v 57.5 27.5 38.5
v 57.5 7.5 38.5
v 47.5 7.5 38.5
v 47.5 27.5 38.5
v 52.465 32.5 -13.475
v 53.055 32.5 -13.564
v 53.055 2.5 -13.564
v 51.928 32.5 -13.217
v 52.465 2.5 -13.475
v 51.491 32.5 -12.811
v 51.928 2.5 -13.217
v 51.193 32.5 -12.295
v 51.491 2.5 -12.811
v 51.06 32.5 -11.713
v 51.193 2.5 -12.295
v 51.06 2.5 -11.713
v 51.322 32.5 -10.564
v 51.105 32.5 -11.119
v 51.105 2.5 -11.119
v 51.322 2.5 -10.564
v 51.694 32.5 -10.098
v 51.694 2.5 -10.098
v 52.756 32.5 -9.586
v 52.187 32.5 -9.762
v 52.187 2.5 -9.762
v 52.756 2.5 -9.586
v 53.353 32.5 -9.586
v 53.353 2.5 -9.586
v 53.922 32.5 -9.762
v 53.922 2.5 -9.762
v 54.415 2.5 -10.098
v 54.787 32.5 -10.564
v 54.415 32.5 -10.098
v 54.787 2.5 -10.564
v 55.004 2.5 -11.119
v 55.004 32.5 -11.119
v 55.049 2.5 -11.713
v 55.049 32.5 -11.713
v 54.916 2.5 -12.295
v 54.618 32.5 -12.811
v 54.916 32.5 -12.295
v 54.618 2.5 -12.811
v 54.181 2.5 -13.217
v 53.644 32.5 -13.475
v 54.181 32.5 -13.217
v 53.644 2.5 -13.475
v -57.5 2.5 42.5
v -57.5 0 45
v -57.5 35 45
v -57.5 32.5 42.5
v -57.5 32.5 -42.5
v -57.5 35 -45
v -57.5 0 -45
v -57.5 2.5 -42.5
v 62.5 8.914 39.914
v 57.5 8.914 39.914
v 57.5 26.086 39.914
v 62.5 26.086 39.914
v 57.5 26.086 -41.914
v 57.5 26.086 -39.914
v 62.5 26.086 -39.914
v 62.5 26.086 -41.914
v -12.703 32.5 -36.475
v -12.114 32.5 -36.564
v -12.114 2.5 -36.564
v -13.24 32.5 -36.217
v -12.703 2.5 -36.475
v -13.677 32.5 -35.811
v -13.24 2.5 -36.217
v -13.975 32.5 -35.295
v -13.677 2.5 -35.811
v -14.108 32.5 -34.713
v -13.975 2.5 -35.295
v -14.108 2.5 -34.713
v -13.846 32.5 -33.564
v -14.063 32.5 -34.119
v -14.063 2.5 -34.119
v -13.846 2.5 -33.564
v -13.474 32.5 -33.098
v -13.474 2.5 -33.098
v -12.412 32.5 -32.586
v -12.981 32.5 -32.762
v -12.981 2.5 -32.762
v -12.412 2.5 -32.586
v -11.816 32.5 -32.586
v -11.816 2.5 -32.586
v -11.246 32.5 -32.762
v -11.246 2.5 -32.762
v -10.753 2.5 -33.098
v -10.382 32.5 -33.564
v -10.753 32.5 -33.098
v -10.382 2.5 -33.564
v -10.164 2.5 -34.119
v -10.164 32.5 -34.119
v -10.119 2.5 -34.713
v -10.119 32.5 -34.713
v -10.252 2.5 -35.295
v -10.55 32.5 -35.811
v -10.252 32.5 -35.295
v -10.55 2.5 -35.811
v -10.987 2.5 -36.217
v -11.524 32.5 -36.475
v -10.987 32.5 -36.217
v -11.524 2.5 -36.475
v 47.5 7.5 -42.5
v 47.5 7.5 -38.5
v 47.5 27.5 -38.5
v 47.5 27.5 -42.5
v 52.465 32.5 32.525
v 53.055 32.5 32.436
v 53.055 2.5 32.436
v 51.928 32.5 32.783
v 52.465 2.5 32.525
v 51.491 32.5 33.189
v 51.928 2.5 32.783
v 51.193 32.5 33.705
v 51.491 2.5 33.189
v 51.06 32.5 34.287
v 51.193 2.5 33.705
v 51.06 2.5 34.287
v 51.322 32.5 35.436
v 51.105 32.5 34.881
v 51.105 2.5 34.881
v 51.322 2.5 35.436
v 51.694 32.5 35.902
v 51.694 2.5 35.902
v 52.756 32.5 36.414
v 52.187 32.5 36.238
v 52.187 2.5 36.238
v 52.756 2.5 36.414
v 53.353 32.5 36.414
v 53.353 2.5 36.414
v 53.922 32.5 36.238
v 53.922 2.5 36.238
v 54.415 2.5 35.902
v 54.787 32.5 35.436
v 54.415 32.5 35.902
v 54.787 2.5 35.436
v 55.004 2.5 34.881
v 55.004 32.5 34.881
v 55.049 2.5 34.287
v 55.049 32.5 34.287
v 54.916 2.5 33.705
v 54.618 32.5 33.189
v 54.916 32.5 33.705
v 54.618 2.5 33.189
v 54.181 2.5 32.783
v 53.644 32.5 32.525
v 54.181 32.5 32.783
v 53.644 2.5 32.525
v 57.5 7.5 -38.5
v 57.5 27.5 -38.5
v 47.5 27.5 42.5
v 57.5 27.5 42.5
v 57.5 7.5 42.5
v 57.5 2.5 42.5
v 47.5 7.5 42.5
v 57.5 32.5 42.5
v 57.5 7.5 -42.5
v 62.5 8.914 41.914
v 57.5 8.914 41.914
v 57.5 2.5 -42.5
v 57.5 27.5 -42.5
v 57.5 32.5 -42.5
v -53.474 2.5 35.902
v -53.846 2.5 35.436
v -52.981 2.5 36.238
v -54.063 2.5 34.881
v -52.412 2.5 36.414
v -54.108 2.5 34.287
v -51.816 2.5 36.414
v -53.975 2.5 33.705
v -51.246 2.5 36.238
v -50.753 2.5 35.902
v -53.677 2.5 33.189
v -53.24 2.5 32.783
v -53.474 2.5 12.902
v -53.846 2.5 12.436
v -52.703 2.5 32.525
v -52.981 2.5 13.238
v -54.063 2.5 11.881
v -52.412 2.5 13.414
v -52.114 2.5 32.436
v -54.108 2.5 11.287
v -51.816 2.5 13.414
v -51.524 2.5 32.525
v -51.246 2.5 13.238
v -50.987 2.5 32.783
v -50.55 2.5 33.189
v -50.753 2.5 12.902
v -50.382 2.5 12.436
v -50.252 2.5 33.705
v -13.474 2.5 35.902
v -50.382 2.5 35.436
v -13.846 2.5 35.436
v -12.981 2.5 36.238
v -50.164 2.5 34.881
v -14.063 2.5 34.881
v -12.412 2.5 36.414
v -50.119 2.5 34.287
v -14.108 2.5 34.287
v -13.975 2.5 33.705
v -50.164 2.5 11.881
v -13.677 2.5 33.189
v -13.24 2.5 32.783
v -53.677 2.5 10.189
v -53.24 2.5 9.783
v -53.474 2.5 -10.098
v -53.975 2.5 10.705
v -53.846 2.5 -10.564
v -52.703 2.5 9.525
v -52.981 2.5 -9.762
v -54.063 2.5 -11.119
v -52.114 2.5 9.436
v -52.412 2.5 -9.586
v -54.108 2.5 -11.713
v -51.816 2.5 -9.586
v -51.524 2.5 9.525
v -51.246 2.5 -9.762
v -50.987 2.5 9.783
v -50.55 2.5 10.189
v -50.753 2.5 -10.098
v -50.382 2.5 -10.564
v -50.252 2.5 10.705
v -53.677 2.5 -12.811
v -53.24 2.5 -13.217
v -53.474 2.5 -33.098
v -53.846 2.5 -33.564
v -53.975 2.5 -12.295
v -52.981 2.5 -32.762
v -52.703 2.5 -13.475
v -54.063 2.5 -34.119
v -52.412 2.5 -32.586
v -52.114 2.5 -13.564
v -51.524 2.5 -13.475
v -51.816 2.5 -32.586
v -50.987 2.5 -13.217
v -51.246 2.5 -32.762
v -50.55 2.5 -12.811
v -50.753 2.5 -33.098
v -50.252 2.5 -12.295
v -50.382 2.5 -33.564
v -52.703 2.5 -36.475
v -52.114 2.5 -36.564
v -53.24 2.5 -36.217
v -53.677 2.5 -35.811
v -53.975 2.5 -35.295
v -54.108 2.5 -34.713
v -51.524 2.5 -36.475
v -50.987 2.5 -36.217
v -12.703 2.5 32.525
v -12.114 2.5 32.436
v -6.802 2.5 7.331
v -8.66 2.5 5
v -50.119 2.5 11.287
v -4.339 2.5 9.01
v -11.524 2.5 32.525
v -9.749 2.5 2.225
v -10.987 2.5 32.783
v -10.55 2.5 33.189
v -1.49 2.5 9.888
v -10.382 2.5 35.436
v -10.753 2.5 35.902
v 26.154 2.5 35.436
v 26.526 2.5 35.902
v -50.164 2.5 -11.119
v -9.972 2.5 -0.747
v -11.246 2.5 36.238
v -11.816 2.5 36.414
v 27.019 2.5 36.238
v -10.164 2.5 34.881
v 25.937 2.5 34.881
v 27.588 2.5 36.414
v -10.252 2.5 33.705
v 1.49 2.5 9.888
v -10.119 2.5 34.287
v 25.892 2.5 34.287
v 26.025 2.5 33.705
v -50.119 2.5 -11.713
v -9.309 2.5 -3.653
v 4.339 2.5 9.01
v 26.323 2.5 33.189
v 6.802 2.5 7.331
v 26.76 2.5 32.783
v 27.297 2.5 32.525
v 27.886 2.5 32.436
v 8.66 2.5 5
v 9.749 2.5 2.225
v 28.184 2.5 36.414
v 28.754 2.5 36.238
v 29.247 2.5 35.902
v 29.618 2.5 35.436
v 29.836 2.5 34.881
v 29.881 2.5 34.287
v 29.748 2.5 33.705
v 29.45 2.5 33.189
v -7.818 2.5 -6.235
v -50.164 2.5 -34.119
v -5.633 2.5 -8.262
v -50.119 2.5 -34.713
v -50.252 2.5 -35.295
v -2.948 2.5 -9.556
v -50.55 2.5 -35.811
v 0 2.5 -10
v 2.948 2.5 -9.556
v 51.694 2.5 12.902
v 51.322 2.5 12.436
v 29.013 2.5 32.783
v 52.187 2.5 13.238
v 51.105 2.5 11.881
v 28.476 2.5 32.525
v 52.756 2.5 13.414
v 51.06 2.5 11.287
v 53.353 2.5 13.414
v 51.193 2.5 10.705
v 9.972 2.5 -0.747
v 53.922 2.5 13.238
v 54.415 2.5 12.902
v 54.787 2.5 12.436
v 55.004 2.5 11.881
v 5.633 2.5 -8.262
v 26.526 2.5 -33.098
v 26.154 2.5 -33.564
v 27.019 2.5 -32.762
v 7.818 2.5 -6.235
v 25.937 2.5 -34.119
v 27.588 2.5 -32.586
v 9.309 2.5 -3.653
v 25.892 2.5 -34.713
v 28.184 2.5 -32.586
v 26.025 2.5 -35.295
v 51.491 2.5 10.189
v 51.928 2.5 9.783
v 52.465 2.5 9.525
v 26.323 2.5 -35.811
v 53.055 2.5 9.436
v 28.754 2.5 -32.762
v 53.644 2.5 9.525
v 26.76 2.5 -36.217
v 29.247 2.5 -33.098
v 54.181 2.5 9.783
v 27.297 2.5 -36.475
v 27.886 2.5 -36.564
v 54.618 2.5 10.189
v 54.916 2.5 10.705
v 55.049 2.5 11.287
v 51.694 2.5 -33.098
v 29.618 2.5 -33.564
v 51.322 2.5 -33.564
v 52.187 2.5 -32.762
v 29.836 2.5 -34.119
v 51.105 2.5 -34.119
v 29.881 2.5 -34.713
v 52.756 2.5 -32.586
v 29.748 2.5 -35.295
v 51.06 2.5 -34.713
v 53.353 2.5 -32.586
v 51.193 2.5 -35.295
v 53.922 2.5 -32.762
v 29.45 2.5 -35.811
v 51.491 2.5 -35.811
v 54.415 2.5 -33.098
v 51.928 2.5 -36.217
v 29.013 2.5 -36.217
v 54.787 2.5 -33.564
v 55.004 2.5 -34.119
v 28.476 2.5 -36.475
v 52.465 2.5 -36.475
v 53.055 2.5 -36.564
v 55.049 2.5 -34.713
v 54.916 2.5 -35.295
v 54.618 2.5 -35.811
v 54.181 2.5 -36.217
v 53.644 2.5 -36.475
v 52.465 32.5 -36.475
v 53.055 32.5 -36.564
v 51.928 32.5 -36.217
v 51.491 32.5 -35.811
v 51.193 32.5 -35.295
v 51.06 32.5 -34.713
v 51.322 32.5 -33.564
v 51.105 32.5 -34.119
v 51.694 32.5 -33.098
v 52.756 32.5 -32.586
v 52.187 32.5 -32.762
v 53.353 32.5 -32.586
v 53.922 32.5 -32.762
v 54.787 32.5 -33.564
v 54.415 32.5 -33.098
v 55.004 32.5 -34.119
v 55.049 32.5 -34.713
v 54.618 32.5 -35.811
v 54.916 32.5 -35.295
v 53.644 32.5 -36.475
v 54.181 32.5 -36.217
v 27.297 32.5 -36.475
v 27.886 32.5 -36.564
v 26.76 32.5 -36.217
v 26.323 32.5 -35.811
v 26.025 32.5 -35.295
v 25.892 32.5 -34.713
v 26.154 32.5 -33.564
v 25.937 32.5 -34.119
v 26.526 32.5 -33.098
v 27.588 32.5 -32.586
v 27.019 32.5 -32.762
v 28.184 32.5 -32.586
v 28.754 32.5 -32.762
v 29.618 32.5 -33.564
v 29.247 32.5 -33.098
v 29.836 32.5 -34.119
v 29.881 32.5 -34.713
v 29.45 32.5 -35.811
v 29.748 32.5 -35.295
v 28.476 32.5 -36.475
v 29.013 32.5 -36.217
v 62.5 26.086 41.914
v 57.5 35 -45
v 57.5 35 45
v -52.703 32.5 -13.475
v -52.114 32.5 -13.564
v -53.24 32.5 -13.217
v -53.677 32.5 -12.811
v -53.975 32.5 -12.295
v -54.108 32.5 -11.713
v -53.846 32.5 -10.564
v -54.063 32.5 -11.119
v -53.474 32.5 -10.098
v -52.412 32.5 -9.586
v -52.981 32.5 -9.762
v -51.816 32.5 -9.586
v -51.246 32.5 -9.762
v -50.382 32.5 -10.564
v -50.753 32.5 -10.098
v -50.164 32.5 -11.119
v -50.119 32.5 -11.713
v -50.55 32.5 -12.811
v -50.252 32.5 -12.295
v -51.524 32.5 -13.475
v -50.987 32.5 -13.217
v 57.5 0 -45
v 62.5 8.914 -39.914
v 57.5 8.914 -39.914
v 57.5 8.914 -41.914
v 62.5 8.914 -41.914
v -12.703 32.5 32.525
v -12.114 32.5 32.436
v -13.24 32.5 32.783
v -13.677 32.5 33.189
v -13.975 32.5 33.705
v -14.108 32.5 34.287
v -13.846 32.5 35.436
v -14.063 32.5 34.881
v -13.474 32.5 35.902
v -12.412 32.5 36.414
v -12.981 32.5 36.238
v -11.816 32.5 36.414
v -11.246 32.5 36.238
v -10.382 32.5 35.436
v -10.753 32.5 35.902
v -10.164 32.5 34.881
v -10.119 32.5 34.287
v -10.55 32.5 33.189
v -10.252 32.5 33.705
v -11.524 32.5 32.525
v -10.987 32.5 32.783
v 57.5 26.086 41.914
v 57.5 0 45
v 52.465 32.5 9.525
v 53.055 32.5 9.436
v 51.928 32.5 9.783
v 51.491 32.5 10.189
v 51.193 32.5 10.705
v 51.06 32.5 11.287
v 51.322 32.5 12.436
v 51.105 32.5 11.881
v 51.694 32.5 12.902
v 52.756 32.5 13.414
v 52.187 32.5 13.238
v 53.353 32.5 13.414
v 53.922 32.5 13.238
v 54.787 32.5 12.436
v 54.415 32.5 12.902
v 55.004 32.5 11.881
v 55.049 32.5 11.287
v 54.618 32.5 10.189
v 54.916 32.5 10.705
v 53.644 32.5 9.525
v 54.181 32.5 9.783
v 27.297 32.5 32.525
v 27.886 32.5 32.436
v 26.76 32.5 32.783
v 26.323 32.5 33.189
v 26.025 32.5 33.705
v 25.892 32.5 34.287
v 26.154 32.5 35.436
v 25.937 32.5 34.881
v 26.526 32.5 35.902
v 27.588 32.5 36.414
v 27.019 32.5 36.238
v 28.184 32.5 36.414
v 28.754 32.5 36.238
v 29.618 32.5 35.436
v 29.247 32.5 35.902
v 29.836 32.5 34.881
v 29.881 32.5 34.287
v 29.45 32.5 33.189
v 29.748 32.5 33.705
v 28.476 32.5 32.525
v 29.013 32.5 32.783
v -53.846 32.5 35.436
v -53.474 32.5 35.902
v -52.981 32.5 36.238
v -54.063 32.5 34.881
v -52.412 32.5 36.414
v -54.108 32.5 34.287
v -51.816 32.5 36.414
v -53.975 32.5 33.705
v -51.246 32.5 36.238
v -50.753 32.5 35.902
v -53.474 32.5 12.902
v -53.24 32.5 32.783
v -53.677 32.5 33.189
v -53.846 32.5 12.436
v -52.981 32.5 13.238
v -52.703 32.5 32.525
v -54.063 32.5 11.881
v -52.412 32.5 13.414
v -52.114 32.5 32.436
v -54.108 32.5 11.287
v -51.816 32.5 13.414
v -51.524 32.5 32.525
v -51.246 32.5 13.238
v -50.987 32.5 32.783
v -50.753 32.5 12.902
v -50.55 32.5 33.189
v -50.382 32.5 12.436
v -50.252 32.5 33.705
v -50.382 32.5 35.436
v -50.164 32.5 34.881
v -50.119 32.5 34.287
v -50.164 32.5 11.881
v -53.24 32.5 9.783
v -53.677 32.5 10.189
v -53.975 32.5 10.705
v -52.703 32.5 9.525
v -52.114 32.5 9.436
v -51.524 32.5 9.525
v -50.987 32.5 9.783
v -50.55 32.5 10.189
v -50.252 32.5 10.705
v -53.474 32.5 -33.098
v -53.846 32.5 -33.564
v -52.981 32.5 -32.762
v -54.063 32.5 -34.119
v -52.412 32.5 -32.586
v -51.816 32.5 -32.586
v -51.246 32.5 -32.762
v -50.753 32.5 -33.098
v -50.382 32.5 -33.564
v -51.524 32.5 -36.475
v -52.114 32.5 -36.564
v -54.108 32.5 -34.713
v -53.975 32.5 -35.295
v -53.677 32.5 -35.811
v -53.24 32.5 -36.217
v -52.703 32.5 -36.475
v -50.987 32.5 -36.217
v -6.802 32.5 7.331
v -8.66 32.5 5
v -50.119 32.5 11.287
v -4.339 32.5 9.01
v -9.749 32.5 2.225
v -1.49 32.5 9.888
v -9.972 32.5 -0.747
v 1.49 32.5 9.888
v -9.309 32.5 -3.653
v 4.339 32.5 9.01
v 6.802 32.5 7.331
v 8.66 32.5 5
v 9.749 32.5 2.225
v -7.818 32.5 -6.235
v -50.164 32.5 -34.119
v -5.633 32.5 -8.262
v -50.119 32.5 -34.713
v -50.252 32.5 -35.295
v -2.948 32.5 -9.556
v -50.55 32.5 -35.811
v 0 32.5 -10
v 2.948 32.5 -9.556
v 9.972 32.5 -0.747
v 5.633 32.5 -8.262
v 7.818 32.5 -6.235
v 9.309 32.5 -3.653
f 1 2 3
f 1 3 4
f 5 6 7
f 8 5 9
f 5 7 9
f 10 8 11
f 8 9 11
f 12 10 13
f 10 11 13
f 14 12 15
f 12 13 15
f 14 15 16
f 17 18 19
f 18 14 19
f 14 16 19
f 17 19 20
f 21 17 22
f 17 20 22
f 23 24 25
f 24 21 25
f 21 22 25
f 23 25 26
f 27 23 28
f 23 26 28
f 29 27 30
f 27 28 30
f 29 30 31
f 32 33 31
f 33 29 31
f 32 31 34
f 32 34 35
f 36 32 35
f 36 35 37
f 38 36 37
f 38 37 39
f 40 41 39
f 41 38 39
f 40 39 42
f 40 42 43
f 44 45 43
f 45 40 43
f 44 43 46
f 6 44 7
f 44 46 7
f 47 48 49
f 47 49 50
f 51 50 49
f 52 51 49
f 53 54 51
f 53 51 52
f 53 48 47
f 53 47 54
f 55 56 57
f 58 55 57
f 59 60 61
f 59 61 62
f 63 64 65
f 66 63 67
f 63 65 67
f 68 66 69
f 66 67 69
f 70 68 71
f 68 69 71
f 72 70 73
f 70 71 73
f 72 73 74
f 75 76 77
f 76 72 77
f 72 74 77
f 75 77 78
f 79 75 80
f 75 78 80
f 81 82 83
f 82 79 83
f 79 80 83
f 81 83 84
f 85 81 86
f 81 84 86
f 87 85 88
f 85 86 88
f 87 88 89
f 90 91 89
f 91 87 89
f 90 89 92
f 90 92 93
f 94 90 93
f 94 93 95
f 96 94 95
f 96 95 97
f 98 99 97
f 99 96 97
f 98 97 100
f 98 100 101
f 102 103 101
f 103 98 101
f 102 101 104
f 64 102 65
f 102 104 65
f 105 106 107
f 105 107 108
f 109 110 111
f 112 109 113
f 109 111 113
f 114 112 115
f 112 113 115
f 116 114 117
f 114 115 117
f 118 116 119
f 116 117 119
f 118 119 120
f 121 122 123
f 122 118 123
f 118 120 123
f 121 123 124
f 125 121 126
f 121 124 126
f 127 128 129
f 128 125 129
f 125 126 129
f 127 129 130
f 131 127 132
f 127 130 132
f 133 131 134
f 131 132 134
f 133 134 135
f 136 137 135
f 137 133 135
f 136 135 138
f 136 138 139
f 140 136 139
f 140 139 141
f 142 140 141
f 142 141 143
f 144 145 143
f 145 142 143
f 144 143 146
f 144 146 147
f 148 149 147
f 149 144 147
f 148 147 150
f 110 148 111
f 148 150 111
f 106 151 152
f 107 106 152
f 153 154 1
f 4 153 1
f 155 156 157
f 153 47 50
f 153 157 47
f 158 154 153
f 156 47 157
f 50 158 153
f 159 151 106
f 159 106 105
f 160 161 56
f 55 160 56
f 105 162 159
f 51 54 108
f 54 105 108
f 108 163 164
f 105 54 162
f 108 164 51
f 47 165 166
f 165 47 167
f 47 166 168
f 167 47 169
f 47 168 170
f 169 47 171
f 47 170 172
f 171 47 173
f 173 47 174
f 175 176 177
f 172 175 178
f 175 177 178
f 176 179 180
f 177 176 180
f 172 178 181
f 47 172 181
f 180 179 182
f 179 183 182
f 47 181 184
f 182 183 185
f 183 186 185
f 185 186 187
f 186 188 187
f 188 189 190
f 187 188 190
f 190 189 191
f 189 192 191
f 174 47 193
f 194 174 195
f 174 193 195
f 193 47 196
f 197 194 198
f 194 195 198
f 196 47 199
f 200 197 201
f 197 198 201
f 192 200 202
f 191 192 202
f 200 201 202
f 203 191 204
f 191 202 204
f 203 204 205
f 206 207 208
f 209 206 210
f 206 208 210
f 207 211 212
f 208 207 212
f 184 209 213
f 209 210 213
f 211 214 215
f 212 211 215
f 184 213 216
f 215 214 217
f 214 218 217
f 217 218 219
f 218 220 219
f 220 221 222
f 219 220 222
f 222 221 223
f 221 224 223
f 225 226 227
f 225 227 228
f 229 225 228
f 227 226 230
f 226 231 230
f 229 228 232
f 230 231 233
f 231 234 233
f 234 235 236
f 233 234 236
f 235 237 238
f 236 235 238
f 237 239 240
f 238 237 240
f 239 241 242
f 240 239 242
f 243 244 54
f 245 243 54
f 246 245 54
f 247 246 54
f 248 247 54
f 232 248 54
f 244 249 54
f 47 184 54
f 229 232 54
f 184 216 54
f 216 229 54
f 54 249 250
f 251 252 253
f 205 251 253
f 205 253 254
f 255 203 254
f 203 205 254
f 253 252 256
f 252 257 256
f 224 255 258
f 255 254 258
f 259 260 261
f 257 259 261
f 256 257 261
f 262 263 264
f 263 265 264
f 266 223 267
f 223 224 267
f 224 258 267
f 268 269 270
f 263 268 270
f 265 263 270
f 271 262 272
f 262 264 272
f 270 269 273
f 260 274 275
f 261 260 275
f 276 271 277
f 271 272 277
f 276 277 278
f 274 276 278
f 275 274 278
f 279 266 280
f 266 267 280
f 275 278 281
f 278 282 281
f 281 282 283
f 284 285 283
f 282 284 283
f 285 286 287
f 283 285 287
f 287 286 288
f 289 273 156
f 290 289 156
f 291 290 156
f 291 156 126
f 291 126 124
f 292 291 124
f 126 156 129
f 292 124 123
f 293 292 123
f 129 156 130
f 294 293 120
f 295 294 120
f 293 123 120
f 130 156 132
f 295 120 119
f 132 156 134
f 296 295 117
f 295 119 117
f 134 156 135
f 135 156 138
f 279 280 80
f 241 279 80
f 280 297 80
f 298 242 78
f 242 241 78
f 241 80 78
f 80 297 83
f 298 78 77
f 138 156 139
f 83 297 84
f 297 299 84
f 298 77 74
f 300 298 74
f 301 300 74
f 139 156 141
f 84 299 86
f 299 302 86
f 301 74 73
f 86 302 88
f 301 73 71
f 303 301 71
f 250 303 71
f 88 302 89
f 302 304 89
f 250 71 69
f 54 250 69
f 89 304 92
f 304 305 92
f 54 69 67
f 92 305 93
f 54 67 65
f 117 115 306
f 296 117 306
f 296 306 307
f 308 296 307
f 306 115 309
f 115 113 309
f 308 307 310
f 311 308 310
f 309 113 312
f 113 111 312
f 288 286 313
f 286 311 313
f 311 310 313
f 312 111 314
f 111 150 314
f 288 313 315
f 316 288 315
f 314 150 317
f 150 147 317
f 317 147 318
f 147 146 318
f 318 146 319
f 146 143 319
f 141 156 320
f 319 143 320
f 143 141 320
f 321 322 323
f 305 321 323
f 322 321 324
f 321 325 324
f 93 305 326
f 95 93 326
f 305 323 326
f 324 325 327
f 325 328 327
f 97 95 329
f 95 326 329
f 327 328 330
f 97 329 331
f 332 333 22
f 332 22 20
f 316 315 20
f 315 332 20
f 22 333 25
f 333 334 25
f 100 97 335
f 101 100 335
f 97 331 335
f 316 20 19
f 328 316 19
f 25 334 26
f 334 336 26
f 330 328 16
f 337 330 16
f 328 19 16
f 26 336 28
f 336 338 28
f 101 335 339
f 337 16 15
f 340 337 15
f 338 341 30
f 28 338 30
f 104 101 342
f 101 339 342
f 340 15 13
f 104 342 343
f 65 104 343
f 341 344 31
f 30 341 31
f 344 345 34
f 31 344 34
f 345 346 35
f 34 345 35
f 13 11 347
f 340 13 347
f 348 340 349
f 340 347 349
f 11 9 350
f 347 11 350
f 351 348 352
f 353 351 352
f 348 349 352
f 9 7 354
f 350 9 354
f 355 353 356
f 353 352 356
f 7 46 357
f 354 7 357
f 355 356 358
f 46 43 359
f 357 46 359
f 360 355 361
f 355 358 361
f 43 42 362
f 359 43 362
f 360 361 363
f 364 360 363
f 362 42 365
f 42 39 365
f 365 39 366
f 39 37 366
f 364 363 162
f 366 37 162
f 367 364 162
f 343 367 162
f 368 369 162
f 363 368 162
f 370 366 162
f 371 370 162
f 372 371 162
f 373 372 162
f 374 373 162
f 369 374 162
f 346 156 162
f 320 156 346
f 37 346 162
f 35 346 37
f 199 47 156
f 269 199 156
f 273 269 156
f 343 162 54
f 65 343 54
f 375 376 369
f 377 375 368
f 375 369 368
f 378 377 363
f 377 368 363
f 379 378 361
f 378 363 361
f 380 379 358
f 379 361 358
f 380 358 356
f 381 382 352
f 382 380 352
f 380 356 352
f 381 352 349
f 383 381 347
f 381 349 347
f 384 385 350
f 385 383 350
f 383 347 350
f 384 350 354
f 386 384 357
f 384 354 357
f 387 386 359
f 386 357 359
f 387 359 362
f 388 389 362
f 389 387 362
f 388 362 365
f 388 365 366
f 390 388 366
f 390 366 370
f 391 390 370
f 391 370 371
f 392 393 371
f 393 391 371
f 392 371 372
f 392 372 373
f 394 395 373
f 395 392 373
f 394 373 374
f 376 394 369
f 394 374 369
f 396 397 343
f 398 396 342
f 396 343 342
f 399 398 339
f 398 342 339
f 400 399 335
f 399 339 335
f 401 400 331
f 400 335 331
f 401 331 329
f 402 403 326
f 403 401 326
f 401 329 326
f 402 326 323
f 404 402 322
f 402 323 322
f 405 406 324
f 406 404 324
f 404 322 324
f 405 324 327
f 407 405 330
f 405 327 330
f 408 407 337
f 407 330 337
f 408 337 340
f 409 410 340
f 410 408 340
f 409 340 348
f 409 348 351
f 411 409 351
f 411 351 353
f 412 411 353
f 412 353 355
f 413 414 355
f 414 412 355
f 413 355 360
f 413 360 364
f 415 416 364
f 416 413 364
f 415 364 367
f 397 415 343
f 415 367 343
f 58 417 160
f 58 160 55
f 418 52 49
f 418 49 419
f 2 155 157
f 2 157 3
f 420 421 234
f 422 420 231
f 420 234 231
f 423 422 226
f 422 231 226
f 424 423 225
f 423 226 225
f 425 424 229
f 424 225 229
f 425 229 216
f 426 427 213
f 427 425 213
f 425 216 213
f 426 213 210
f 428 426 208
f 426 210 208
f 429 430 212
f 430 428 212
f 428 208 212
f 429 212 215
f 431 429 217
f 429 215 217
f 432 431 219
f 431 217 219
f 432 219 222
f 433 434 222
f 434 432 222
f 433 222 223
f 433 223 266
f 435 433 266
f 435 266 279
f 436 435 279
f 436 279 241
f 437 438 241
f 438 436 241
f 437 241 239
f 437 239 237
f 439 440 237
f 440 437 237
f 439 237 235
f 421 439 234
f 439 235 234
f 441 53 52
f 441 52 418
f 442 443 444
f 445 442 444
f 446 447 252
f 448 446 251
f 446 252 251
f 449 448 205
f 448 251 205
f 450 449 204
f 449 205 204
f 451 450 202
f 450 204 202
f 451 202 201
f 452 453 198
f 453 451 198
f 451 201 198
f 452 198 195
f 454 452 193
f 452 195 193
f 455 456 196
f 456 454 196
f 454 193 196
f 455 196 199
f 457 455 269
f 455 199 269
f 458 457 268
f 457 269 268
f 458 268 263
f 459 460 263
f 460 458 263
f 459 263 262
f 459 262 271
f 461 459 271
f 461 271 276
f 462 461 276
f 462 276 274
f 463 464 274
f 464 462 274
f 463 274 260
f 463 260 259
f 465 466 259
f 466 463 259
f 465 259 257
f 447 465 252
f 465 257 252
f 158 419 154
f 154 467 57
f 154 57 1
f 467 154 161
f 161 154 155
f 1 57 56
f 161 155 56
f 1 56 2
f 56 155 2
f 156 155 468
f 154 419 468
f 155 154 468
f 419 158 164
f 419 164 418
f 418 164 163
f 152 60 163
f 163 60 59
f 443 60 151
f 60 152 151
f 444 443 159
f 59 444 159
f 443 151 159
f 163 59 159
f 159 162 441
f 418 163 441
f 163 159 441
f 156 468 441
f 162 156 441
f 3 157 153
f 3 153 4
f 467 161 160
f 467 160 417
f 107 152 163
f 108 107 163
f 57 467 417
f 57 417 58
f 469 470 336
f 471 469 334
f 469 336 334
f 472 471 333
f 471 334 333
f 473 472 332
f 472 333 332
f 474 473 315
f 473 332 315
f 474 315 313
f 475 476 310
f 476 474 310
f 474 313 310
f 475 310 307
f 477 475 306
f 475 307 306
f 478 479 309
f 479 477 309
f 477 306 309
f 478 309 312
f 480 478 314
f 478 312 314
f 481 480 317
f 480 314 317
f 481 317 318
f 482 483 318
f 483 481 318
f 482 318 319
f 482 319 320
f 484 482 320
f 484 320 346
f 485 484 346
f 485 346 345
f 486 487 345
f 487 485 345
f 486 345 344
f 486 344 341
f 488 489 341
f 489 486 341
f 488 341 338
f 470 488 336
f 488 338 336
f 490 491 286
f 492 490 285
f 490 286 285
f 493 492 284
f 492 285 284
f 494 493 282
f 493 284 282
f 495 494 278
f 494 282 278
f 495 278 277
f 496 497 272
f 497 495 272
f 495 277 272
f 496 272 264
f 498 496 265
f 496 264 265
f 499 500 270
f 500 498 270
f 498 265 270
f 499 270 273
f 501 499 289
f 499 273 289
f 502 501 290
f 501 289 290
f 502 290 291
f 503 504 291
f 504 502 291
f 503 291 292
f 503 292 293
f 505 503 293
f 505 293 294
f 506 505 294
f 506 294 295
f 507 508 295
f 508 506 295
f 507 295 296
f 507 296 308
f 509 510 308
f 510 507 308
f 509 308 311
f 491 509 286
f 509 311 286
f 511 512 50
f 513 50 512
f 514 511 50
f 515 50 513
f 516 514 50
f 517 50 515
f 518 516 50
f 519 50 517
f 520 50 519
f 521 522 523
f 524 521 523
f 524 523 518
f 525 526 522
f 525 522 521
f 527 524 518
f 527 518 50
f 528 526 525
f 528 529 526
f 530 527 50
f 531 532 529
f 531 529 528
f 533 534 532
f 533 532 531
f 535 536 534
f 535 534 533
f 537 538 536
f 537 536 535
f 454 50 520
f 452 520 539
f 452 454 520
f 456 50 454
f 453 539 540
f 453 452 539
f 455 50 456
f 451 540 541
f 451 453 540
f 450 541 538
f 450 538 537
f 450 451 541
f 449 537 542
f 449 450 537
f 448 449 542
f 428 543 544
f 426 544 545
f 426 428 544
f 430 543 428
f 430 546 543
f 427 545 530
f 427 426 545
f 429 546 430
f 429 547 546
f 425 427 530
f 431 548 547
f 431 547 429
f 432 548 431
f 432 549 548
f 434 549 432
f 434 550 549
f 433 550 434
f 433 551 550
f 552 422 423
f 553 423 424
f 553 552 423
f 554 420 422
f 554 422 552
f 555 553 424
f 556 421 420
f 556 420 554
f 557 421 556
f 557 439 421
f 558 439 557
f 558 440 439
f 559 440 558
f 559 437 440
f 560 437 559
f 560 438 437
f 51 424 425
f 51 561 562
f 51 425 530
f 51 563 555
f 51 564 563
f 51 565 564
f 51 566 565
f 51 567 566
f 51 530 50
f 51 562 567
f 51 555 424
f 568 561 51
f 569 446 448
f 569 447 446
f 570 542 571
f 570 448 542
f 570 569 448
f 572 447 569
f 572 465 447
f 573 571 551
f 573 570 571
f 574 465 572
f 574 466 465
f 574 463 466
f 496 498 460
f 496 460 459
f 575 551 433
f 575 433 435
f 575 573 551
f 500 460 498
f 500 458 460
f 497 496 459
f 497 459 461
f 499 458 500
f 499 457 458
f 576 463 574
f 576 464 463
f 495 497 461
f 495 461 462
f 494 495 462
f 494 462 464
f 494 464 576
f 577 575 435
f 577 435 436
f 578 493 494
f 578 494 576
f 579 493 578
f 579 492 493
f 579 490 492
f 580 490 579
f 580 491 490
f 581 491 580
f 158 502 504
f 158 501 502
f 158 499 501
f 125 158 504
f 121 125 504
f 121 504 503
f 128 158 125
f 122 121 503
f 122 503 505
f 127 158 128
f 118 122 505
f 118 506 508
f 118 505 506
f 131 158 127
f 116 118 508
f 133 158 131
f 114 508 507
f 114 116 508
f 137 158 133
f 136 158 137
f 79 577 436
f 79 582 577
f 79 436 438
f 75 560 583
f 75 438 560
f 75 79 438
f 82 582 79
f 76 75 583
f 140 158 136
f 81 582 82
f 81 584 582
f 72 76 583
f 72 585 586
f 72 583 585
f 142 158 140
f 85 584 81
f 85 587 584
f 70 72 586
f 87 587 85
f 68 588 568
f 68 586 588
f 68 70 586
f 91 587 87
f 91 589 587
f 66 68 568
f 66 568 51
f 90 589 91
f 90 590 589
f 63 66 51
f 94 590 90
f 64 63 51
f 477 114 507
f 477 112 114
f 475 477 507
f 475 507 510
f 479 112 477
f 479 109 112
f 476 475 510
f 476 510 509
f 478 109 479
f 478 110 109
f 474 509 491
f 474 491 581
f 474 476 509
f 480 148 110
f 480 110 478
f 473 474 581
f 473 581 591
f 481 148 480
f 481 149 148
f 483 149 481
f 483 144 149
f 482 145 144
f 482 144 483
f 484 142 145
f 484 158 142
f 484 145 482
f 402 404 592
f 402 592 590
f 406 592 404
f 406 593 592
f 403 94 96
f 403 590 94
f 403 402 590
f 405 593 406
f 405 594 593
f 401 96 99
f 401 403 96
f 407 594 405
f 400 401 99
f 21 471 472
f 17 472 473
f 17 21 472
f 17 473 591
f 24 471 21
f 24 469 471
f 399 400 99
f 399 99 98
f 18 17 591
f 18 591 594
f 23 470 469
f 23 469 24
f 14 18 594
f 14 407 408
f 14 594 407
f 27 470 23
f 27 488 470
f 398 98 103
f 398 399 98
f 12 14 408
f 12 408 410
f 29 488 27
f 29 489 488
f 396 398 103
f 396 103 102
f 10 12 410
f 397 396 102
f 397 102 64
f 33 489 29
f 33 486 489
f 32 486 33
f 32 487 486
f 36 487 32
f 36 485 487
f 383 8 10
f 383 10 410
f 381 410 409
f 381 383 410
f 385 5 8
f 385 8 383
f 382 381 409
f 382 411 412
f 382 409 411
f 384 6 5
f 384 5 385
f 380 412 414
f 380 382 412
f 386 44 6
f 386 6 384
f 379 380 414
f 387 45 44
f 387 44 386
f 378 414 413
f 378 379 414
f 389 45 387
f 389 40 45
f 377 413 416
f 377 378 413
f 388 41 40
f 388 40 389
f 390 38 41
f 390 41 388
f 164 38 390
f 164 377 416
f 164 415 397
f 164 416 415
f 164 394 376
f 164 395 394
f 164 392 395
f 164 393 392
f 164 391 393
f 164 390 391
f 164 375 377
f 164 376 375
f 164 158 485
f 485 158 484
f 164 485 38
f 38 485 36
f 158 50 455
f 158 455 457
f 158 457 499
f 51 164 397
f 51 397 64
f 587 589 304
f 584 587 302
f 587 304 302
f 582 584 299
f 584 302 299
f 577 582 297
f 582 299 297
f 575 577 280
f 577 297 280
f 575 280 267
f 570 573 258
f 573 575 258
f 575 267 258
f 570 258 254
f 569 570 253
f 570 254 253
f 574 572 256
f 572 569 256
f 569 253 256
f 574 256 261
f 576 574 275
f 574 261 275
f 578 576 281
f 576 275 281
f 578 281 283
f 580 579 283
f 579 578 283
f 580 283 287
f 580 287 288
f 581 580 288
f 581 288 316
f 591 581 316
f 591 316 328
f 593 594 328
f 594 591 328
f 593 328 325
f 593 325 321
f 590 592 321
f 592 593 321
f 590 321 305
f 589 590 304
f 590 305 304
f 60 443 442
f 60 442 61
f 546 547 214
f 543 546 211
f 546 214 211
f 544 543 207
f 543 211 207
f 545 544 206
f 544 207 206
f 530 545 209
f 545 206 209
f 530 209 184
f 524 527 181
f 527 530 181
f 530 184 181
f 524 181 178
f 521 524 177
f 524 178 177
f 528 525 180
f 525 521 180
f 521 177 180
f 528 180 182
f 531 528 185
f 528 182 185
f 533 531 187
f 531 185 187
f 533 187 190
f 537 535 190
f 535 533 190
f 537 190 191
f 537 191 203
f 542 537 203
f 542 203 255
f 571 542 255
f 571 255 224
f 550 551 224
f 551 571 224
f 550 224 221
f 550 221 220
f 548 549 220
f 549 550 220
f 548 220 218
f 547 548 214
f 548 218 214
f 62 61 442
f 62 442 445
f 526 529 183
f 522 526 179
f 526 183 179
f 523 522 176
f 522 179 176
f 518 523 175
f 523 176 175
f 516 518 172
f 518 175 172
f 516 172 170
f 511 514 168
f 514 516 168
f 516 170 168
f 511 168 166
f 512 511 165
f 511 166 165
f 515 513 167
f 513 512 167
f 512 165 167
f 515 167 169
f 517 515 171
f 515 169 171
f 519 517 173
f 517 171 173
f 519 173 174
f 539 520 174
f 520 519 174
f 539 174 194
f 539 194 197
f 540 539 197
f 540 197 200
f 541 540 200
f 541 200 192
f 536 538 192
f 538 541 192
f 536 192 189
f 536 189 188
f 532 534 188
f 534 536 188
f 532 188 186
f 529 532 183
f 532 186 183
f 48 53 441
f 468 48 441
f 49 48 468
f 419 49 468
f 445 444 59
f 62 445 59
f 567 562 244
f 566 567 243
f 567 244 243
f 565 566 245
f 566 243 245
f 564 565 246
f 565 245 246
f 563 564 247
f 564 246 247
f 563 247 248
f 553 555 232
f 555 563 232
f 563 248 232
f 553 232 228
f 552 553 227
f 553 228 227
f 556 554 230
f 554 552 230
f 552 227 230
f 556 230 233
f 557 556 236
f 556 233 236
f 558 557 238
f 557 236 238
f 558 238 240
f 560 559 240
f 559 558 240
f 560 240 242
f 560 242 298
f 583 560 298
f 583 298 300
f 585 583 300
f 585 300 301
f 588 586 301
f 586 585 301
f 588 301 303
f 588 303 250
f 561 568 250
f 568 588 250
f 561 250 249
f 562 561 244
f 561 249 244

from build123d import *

# Parameters (mm, degrees)
SKETCH_1_W          = 115
SKETCH_1_H          = 90
EXTRUDE_1_DEPTH     = 35
SKETCH_2_W          = 85
SKETCH_2_H          = 30
CUT_EXTRUDE_1_DEPTH = 129.35497653
SKETCH_3_W          = 4
SKETCH_3_H          = 20
EXTRUDE_2_DEPTH     = 10
SKETCH_4_W          = 2
SKETCH_4_H          = 17.171572876
EXTRUDE_3_DEPTH     = 5
SKETCH_5_R          = 2
SKETCH_5_R_2        = 10
EXTRUDE_4_DEPTH     = 32


with BuildPart() as part:
    # Эскиз1 → Бобышка-Вытянуть1 (new body)
    with BuildSketch(Plane(origin=(0, 0, 0), x_dir=(1, 0, 0), z_dir=(0, 1, 0))):
        Rectangle(SKETCH_1_W, SKETCH_1_H)
    extrude(amount=EXTRUDE_1_DEPTH)

    # Эскиз2 → Вырез-Вытянуть1 (cut, through all)
    with BuildSketch(Plane(origin=(57.5, 0, 0), x_dir=(0, 0, -1), z_dir=(1, 0, 0))):
        with Locations((0, 17.5)):
            Rectangle(SKETCH_2_W, SKETCH_2_H)
    extrude(amount=-CUT_EXTRUDE_1_DEPTH, mode=Mode.SUBTRACT)

    # Эскиз3 → Бобышка-Вытянуть2 (add)
    with BuildSketch(Plane(origin=(57.5, 0, 0), x_dir=(0, 0, -1), z_dir=(1, 0, 0))):
        with Locations((40.5, 17.5)):
            Rectangle(SKETCH_3_W, SKETCH_3_H)
        with Locations((-40.5, 17.5)):
            Rectangle(SKETCH_3_W, SKETCH_3_H)
    extrude(amount=-EXTRUDE_2_DEPTH)

    # Эскиз4 → Бобышка-Вытянуть3 (add)
    with BuildSketch(Plane(origin=(57.5, 0, 0), x_dir=(0, 0, -1), z_dir=(1, 0, 0))):
        with Locations((40.914213562, 17.5)):
            Rectangle(SKETCH_4_W, SKETCH_4_H)
        with Locations((-40.914213562, 17.5)):
            Rectangle(SKETCH_4_W, SKETCH_4_H)
    extrude(amount=EXTRUDE_3_DEPTH)

    # Эскиз5 → Бобышка-Вытянуть4 (add)
    with BuildSketch(Plane(origin=(0, 2.5, 0), x_dir=(1, 0, 0), z_dir=(0, 1, 0))):
        with Locations(Location((-52.113626613, 34.564029455, 0), (0, 0, 90))):
            Circle(SKETCH_5_R)
        with Locations(Location((-52.113626613, 11.564029455, 0), (0, 0, 90))):
            Circle(SKETCH_5_R)
        with Locations(Location((-52.113626613, -11.435970545, 0), (0, 0, 90))):
            Circle(SKETCH_5_R)
        with Locations(Location((-52.113626613, -34.435970545, 0), (0, 0, 90))):
            Circle(SKETCH_5_R)
        with Locations(Location((53.054505716, 34.564029455, 0), (0, 0, 90))):
            Circle(SKETCH_5_R)
        with Locations(Location((53.054505716, 11.564029455, 0), (0, 0, 90))):
            Circle(SKETCH_5_R)
        with Locations(Location((53.054505716, -11.435970545, 0), (0, 0, 90))):
            Circle(SKETCH_5_R)
        with Locations(Location((53.054505716, -34.435970545, 0), (0, 0, 90))):
            Circle(SKETCH_5_R)
        with Locations(Location((-12.113626613, 34.564029455, 0), (0, 0, 90))):
            Circle(SKETCH_5_R)
        with Locations(Location((27.886373387, 34.564029455, 0), (0, 0, 90))):
            Circle(SKETCH_5_R)
        with Locations(Location((-12.113626613, -34.435970545, 0), (0, 0, 90))):
            Circle(SKETCH_5_R)
        with Locations(Location((27.886373387, -34.435970545, 0), (0, 0, 90))):
            Circle(SKETCH_5_R)
        with Locations(Location((0, 0, 0), (0, 0, 90))):
            Circle(SKETCH_5_R_2)
    extrude(amount=EXTRUDE_4_DEPTH)


solid = part.part
